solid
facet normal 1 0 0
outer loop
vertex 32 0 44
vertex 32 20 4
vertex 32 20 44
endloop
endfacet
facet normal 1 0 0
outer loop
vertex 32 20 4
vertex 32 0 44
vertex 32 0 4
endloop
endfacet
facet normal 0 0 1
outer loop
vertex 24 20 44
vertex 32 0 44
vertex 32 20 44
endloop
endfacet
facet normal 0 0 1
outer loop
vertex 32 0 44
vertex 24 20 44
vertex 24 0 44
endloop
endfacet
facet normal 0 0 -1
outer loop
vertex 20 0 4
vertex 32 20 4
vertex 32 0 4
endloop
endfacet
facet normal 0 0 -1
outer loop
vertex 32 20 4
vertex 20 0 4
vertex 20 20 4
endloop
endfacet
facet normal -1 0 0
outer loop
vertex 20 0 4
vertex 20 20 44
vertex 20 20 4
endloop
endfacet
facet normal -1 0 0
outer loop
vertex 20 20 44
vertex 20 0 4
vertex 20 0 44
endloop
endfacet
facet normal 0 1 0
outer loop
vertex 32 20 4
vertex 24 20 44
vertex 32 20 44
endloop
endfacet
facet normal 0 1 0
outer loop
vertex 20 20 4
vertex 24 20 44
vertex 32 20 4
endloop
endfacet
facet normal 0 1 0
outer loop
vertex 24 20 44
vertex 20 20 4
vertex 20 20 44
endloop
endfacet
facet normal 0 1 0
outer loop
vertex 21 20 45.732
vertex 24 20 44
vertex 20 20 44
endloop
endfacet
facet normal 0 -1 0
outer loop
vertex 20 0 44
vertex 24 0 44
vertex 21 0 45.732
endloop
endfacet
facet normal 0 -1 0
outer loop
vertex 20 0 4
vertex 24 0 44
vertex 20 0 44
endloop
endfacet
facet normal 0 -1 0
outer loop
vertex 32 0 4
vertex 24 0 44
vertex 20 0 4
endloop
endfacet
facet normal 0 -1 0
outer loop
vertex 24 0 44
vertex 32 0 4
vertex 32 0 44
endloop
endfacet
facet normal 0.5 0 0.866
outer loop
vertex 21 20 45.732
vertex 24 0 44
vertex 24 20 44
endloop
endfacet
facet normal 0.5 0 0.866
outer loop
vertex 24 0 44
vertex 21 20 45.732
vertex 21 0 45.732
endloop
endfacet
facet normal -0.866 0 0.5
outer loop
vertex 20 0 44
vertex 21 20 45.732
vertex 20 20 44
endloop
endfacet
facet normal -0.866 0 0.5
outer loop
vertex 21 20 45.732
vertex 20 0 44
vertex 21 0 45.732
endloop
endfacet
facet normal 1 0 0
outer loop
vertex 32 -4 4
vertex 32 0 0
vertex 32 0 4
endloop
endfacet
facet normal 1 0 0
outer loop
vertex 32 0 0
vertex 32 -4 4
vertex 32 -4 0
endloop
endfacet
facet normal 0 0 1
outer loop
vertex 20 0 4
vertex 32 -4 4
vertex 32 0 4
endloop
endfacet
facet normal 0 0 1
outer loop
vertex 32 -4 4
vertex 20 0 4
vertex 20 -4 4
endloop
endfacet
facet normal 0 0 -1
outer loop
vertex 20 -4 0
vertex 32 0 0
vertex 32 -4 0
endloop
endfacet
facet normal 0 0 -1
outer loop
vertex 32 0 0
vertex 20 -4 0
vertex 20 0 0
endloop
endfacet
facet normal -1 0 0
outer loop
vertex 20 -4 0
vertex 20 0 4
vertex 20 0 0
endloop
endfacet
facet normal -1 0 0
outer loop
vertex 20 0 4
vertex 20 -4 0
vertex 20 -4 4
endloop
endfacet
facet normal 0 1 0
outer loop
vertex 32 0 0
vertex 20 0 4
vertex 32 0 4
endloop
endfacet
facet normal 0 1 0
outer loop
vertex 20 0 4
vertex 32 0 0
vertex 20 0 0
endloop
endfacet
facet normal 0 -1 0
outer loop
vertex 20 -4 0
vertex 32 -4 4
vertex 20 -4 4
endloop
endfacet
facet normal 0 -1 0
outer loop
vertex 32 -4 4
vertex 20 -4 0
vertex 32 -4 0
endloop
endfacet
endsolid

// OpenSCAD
/*
  Overhang test: prints angled roofs from 30° to 80° (from vertical).
  Params let you change step, thickness, and label size.
*/
angle_start = 30;  // deg from vertical
angle_end   = 80;
angle_step  = 10;
thickness   = 2;
tower_w     = 12;
tower_d     = 20;
tower_h     = 40;
base_h      = 4;
gap         = 8;

module tower(angle){
    // body
    translate([0,0,base_h]) cube([tower_w, tower_d, tower_h], center=false);
    // roof as overhang
    translate([0,0,base_h + tower_h])
        rotate([0, angle, 0])
            cube([tower_w, tower_d, thickness], center=false);
    // label tab
    translate([0, -4, 0]) cube([tower_w, 4, base_h], center=false);
}

x = 0;
for (a = [angle_start:angle_step:angle_end]){
    translate([x,0,0]) tower(a);
    x = x + tower_w + gap;
}
